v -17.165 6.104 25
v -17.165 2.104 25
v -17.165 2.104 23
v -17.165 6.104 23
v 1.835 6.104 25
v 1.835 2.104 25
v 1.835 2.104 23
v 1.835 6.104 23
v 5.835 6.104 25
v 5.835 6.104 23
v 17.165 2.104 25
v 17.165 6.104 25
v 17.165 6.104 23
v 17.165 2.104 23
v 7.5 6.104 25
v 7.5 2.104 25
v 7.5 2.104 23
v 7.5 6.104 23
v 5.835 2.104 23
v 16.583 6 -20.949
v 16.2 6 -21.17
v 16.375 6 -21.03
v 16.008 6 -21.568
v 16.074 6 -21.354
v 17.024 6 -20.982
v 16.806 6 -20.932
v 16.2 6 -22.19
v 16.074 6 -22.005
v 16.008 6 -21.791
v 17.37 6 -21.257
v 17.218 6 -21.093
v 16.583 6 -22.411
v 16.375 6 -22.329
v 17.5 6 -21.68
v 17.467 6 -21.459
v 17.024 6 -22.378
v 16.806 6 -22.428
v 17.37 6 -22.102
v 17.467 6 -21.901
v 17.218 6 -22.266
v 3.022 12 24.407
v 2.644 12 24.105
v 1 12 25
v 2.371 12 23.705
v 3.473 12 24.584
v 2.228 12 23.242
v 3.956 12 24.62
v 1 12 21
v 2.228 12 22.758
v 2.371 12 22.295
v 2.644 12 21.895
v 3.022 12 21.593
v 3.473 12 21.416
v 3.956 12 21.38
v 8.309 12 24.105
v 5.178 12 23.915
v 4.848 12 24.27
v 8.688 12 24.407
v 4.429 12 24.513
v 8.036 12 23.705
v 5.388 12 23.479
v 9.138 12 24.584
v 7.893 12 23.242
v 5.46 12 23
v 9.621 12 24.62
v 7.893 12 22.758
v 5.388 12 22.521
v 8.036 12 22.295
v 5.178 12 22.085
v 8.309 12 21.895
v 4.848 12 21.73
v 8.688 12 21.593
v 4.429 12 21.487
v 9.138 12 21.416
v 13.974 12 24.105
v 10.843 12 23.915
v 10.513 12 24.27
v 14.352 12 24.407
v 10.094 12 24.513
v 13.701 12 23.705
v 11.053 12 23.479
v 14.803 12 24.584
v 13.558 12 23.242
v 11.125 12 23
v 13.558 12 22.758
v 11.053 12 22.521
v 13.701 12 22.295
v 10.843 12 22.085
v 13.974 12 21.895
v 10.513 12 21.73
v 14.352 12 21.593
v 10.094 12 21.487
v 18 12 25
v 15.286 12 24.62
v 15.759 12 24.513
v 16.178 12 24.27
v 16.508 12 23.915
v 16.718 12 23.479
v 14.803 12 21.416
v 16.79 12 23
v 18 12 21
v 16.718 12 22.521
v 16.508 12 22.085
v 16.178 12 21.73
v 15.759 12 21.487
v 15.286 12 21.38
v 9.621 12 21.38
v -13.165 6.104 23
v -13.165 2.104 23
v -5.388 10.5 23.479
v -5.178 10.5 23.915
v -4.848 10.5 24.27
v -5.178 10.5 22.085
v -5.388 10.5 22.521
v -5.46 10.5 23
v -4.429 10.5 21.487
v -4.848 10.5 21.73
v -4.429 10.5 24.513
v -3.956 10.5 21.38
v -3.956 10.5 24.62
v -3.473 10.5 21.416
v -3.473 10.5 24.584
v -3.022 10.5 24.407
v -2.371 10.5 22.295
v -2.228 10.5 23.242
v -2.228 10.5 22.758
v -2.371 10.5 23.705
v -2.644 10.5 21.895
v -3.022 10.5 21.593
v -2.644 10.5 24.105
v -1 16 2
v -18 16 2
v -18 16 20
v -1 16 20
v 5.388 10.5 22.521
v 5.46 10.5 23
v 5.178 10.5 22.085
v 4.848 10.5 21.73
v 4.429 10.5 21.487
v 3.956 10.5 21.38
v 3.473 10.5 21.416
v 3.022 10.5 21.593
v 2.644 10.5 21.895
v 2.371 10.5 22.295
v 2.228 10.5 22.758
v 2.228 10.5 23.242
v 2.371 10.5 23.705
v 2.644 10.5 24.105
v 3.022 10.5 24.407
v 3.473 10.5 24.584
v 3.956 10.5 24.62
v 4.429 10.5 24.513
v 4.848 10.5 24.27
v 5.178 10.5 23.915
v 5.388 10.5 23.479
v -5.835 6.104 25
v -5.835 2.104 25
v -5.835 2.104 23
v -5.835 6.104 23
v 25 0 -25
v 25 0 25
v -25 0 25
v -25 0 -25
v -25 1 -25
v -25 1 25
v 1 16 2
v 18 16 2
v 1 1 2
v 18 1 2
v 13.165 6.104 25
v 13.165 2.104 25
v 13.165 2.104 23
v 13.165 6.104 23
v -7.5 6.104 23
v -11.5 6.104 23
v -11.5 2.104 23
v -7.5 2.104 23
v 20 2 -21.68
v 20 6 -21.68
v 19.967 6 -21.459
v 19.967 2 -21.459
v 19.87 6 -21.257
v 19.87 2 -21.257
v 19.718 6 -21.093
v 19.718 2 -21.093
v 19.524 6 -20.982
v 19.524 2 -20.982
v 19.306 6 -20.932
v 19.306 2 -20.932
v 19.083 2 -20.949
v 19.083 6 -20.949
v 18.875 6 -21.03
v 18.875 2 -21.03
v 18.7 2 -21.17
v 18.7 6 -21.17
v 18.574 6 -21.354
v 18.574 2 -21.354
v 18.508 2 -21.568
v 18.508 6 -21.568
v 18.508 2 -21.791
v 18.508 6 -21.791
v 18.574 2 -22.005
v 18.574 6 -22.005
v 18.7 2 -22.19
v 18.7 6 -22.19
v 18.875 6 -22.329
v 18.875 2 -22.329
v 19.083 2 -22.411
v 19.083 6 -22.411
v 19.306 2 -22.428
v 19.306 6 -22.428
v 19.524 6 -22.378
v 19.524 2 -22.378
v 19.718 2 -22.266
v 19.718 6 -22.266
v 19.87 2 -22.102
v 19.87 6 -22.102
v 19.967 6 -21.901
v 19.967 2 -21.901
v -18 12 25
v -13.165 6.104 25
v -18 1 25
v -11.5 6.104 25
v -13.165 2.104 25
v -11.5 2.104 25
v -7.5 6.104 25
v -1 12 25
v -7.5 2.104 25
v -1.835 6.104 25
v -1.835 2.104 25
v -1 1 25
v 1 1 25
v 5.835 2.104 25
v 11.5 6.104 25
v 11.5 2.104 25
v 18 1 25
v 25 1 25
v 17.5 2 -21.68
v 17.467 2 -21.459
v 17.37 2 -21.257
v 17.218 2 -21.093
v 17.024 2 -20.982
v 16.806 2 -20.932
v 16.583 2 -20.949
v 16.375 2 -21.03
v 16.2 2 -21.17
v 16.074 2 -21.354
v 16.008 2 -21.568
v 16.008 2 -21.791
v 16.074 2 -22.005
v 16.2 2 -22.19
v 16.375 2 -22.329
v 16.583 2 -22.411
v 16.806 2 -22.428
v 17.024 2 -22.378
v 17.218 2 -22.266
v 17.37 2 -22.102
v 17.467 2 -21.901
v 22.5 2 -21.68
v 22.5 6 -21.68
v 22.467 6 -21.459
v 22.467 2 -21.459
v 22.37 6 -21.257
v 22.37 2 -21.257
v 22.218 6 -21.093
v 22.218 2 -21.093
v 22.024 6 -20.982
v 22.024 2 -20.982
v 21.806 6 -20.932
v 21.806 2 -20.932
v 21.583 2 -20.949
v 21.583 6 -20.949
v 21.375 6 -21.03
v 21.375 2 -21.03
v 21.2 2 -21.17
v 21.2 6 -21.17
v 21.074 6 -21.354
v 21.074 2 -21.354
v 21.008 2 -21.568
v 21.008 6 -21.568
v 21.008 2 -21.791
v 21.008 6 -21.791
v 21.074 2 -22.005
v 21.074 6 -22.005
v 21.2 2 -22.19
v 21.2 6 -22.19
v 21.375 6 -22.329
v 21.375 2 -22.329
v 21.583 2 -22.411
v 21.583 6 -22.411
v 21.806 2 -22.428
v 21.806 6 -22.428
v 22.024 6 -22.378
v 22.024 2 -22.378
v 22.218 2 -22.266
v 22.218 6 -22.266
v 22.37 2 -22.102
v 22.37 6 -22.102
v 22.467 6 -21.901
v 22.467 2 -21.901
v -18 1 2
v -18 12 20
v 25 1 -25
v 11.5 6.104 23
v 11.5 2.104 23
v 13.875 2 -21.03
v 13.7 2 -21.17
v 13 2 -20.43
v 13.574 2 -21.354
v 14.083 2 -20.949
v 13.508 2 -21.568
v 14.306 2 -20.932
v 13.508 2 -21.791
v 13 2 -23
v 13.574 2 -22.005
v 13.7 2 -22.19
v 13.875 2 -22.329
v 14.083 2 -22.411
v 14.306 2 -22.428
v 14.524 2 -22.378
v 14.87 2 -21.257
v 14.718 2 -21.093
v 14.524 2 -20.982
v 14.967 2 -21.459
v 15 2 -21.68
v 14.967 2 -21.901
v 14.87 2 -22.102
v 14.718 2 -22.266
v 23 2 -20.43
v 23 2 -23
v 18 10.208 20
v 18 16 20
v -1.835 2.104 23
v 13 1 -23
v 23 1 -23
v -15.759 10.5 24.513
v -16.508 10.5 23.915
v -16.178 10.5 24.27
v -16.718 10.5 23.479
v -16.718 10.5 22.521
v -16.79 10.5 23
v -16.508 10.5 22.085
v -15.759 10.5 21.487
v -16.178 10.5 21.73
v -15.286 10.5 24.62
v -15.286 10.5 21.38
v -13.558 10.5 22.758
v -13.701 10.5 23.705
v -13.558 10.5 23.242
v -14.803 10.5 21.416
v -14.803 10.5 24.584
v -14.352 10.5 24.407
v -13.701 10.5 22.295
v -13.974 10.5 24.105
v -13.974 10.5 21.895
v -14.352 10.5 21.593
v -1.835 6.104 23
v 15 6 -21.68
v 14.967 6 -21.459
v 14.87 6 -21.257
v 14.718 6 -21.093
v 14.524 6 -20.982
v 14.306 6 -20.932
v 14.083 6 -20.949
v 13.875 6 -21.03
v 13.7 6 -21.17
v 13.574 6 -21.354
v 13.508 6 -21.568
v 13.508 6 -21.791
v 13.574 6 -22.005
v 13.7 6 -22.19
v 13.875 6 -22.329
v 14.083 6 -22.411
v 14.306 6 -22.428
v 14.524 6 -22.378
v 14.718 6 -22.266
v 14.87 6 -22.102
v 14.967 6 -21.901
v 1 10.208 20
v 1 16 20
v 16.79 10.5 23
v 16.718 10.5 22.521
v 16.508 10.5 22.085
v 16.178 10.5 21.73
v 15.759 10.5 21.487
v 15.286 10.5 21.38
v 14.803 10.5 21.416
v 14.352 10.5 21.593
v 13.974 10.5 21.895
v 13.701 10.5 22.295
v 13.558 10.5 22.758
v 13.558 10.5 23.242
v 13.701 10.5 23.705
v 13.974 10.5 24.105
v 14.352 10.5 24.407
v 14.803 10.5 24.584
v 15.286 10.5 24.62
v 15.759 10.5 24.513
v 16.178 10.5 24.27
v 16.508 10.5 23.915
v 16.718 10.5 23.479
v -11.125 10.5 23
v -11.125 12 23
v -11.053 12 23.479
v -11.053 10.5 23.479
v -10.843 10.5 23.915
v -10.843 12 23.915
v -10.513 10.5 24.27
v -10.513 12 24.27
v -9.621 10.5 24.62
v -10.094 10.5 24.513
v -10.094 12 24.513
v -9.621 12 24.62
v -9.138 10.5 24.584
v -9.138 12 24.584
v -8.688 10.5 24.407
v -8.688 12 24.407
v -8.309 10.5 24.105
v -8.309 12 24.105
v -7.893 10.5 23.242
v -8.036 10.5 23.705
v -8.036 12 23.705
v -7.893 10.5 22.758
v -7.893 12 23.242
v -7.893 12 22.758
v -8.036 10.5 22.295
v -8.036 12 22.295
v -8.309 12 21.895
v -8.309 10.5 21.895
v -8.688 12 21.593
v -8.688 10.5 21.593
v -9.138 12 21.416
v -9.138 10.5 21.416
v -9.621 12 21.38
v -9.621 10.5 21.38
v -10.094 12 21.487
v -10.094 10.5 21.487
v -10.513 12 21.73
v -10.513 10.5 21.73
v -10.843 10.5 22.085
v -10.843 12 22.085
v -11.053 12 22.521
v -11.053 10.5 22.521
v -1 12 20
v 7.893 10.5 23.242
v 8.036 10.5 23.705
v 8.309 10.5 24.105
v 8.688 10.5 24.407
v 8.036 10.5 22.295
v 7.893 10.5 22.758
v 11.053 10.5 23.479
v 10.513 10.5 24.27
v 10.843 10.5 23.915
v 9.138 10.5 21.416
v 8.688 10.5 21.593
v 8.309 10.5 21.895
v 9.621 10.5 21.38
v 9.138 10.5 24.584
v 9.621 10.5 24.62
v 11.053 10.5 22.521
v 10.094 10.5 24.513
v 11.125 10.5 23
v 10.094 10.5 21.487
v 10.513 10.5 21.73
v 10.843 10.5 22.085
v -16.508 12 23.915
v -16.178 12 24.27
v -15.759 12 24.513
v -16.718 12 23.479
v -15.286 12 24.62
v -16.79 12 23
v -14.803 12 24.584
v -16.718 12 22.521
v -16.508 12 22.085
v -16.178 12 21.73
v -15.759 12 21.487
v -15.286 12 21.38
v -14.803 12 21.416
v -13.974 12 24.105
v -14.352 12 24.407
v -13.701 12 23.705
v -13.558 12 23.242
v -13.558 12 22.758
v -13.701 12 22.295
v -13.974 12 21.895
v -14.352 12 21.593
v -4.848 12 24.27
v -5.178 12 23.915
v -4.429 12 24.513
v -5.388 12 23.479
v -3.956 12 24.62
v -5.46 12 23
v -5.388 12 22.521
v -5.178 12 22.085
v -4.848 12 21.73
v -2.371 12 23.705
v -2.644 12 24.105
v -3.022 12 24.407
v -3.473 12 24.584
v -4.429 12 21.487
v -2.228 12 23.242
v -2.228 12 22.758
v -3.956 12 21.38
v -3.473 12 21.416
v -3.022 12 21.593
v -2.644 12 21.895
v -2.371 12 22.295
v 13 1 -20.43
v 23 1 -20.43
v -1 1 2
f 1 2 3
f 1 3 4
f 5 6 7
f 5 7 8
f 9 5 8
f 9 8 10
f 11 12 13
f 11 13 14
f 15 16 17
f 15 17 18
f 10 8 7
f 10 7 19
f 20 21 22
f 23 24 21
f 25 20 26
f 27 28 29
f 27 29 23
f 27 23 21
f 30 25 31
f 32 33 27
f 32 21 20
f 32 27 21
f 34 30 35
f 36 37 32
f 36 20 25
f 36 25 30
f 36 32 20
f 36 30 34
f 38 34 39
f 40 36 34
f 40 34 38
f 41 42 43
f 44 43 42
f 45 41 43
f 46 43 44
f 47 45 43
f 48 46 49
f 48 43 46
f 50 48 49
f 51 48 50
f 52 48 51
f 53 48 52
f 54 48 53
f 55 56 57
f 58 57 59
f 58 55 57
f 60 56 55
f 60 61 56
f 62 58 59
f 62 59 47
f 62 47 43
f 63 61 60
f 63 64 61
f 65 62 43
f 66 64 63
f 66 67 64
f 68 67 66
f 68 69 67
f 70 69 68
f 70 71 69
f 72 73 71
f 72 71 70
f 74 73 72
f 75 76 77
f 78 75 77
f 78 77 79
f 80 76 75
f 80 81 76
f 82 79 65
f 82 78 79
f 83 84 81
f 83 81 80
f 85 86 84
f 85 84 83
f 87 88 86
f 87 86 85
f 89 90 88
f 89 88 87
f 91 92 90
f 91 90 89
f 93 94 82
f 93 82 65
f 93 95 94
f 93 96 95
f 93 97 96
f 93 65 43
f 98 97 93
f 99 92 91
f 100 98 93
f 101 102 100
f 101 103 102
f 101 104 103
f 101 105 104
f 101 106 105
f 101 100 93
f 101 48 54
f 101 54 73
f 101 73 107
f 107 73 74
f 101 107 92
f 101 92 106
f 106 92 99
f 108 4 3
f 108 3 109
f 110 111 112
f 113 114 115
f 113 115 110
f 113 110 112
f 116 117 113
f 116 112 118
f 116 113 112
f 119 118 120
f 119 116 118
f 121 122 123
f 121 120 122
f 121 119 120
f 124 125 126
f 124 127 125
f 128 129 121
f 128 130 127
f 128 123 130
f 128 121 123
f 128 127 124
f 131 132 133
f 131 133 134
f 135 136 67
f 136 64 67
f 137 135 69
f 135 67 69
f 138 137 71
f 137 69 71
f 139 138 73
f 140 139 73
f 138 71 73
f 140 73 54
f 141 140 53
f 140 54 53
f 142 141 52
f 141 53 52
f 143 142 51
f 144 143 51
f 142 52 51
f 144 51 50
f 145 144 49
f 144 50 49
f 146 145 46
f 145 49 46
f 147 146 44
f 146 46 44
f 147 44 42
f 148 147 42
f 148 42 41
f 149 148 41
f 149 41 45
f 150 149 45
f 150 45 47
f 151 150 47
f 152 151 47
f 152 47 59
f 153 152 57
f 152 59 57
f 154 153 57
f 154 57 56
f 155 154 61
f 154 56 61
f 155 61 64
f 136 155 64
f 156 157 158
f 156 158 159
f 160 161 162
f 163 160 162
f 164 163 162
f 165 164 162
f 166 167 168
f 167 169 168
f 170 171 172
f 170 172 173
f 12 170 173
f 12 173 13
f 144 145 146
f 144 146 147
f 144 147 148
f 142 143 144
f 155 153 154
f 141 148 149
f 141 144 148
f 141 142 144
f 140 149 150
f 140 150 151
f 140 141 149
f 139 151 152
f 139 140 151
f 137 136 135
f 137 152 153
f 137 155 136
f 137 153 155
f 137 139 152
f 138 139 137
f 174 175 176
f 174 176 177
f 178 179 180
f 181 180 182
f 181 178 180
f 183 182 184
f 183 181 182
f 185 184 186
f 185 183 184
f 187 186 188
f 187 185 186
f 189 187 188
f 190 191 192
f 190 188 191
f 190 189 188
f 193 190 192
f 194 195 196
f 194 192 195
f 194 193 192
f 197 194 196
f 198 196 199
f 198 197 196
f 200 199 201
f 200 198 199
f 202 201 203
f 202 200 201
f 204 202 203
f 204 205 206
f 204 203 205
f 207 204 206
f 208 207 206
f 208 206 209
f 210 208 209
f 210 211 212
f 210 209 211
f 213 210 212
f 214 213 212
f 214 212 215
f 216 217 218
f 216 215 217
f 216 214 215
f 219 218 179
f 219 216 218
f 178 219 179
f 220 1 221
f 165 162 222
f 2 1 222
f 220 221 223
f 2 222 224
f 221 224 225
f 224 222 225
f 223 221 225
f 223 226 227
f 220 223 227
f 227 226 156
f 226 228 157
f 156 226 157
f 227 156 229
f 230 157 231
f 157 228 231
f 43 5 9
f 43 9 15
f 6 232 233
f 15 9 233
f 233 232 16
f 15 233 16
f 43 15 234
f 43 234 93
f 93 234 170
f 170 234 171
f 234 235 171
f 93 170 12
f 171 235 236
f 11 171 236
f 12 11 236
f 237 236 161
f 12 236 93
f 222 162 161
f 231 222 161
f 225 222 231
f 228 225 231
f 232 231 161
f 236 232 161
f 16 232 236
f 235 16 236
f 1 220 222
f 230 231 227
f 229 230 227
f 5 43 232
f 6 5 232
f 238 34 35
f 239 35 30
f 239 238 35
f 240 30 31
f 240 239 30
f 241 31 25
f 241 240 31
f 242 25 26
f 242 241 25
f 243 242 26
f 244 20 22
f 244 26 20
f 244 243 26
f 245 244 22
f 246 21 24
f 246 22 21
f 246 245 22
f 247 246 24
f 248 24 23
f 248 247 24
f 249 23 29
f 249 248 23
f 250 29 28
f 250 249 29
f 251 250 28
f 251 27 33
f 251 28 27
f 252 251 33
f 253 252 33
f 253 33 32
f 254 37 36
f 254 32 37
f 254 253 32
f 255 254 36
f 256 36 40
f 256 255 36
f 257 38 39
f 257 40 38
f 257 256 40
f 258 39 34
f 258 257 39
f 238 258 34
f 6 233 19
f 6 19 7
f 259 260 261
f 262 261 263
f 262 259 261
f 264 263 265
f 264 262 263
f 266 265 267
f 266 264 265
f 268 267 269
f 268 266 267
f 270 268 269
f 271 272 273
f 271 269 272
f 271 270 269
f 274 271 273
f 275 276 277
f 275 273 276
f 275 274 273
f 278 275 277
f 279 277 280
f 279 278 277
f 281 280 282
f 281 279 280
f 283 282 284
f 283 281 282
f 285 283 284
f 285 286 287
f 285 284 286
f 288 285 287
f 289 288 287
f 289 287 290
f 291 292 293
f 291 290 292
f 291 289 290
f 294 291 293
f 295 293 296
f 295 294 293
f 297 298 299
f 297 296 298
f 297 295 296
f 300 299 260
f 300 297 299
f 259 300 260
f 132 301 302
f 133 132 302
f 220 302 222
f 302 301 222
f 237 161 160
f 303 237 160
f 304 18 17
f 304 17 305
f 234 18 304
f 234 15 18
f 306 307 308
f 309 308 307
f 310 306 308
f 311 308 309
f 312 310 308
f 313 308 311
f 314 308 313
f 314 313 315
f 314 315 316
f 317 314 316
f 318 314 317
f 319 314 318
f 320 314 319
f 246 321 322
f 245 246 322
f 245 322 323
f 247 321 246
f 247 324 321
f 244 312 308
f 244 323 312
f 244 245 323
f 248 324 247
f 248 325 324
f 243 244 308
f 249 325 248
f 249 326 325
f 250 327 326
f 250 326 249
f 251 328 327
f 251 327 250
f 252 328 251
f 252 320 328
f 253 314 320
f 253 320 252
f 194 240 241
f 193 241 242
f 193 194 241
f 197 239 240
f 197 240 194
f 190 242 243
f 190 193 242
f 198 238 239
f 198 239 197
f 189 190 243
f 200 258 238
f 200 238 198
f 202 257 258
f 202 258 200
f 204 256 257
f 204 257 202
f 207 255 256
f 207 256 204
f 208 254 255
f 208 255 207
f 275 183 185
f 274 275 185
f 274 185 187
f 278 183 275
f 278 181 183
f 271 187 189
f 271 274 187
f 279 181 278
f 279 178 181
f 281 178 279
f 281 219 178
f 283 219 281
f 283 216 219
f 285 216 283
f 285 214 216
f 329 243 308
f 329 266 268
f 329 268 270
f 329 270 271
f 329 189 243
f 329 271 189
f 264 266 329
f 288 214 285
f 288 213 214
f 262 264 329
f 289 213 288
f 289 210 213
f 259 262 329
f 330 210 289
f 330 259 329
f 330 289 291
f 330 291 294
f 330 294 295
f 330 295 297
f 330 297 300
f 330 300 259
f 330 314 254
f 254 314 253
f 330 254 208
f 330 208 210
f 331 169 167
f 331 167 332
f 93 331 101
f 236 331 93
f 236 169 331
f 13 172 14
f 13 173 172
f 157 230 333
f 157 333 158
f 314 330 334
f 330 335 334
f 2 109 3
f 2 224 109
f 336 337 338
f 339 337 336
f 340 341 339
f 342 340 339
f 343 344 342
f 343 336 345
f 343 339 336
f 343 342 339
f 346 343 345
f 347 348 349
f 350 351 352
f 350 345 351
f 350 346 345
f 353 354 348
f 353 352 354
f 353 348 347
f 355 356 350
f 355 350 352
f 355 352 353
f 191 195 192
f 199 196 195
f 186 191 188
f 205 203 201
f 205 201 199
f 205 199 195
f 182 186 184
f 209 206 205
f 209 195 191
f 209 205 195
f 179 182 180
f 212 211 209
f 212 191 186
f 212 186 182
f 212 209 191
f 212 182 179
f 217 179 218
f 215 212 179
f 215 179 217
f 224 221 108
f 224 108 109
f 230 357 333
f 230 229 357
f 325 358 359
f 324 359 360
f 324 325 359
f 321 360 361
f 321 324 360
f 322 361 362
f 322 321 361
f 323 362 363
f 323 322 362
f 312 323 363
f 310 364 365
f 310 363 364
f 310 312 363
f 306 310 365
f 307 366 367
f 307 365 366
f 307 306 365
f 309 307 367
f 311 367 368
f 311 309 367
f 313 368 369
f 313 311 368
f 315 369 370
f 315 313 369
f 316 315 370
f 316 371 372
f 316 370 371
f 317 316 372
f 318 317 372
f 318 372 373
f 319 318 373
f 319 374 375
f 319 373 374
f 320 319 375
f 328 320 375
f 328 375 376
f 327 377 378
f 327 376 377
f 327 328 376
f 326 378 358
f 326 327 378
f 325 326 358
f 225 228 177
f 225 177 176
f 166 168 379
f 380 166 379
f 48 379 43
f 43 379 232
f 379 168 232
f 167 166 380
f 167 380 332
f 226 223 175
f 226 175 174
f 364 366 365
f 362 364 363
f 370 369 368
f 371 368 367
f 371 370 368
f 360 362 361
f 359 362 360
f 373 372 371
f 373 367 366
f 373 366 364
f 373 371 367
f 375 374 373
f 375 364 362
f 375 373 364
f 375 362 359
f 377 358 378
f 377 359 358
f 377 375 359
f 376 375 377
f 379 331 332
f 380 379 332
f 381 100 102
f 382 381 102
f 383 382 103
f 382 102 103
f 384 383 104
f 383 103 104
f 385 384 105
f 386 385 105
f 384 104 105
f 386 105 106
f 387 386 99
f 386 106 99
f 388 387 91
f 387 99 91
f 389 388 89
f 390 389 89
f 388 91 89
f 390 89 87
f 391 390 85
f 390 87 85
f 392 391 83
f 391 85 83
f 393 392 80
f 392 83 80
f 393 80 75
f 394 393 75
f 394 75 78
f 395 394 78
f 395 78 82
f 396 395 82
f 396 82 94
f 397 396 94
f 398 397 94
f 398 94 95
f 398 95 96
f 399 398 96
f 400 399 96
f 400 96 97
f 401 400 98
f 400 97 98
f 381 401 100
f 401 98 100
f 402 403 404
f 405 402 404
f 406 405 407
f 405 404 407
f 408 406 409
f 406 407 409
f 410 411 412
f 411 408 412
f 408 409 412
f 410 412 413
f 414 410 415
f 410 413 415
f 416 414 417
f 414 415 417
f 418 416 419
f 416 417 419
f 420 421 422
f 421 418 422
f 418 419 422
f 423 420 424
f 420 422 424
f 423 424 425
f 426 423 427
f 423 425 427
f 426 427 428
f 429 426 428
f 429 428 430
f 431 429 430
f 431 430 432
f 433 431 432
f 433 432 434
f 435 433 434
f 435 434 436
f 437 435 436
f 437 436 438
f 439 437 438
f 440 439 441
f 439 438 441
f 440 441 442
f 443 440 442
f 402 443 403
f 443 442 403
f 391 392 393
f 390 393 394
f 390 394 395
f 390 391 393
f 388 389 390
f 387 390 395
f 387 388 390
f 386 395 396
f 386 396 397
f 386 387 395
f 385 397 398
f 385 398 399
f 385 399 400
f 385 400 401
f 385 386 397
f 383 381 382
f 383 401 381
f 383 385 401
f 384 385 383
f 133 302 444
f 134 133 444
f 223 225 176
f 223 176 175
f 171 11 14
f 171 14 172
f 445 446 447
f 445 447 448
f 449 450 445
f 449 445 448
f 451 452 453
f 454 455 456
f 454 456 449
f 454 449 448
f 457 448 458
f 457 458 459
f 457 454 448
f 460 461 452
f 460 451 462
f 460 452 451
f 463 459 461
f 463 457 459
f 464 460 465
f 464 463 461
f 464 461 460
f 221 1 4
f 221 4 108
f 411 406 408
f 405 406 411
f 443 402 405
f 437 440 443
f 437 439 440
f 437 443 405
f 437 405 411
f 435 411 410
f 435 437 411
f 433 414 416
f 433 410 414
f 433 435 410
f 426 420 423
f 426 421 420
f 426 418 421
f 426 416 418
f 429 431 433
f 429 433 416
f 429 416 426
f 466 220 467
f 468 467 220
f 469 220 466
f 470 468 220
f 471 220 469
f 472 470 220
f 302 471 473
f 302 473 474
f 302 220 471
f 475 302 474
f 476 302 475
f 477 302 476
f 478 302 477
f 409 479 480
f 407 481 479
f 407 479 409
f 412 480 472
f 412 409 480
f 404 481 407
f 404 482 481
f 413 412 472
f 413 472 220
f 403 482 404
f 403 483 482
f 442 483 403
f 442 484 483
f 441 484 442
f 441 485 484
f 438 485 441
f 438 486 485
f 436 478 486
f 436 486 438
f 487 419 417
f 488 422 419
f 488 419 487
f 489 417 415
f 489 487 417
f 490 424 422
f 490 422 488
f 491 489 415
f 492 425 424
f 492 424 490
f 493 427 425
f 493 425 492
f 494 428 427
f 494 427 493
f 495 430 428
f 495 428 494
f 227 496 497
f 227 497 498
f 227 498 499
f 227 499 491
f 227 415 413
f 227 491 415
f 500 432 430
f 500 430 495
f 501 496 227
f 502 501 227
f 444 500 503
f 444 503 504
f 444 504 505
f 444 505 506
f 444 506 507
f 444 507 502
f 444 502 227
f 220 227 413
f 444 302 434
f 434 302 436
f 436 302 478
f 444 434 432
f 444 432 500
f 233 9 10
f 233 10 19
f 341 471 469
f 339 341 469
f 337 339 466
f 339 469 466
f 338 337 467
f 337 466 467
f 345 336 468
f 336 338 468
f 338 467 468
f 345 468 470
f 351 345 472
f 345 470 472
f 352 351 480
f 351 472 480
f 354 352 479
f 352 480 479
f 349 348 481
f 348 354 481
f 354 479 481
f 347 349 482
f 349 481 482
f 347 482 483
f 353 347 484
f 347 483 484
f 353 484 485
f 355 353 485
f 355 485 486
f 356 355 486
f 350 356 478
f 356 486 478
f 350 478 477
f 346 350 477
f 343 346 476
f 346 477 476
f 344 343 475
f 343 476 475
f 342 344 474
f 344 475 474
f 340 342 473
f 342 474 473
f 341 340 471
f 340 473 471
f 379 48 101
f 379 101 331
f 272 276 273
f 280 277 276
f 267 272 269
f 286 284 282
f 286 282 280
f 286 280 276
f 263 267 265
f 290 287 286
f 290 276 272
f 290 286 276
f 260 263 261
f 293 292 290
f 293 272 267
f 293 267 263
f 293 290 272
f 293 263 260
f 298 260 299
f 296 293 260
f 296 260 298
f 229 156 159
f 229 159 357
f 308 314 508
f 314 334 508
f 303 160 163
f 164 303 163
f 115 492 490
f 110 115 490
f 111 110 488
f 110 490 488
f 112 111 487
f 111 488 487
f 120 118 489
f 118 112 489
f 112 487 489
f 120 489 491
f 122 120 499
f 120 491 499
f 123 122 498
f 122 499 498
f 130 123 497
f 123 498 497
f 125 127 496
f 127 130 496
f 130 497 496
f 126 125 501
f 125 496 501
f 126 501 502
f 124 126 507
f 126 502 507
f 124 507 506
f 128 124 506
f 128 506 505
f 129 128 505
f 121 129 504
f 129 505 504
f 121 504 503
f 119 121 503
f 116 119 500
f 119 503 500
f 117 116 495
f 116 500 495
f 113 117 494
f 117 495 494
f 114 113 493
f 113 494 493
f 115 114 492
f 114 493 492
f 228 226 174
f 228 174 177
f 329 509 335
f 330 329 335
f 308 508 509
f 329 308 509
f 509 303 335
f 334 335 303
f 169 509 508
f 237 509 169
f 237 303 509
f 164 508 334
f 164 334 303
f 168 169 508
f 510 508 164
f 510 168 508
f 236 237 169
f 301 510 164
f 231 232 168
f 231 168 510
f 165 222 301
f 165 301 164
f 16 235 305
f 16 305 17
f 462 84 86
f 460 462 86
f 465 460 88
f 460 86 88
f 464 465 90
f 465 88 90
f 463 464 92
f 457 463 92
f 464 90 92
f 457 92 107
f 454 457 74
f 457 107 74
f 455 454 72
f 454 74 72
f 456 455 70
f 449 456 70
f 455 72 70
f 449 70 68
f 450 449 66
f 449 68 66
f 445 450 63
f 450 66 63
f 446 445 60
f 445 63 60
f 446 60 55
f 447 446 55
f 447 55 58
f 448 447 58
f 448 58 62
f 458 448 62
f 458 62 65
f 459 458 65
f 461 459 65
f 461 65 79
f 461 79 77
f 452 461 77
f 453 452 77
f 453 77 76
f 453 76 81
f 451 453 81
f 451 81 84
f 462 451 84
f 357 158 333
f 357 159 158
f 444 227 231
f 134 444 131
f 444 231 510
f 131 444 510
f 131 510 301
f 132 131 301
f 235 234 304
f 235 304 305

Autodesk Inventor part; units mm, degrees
ref_plane "YZ Plane" through (0, 0, 0) normal (1, 0, 0) x (0, 1, 0)
ref_plane "XZ Plane" through (0, 0, 0) normal (0, 1, 0) x (-1, 0, 0)
ref_plane "XY Plane" through (0, 0, 0) normal (0, 0, 1) x (1, 0, 0)
sketch "Sketch1" plane through (0, 0, 0) normal (0, 1, 0) x (-1, 0, 0)
  line L0 (-25, 25) -> (-25, -25)
  line L1 (-25, -25) -> (25, -25)
  line L2 (25, -25) -> (25, 25)
  line L3 (25, 25) -> (-25, 25)
  line L4 (-25, 25) -> (25, -25) construction
  line L5 (-25, -25) -> (25, 25) construction
  point P0 (0, 0)
  dimension "d0" = 50
  dimension "d1" = 50
extrude "Extrusion1" add sketch "Sketch1" along normal blind 1
sketch "Sketch2" plane through (0, 1, 0) normal (0, 1, 0) x (1, 0, 0)
  line L0 (25, -25) -> (25, 25) construction
  line L1 (25, -25) -> (25, -20) construction
  line L2 (25, -20) -> (-25, -20) construction
  line L3 (-25, 25) -> (-25, -25) construction
  line L4 (25, -20) -> (25, -2) construction
  line L5 (25, -2) -> (-25, -2) construction
  line L6 (25, -20) -> (18, -20) construction
  line L7 (18, -20) -> (18, -2) construction
  line L8 (-25, -20) -> (-18, -20) construction
  line L9 (-18, -20) -> (-18, -2) construction
  line L10 (1, -2) -> (-1, -2) construction
  line L11 (-1, -2) -> (-1, -20) construction
  line L12 (-1, -20) -> (1, -20) construction
  line L13 (1, -20) -> (1, -2) construction
  line L14 (1, -2) -> (-1, -20) construction
  line L15 (-1, -2) -> (1, -20) construction
  line L16 (18, -2) -> (1, -2)
  line L17 (1, -2) -> (1, -20)
  line L18 (1, -20) -> (18, -20)
  line L19 (18, -20) -> (18, -2)
  line L20 (-1, -2) -> (-18, -2)
  line L21 (-18, -2) -> (-18, -20)
  line L22 (-18, -20) -> (-1, -20)
  line L23 (-1, -20) -> (-1, -2)
  point P0 (0, 0)
  point P1 (0, -11)
  dimension "d4" = 5
  dimension "d5" = 18
  dimension "d6" = 7
  dimension "d7" = 7
  dimension "d8" = 2
extrude "Extrusion2" add sketch "Sketch2" along normal blind 15
sketch "Sketch3" plane through (0, 1, 0) normal (0, 1, 0) x (1, 0, 0)
  line L0 (18, -20) -> (1, -20) projected
  line L1 (18, -20) -> (18, -25)
  line L2 (-25, -25) -> (25, -25) projected
  line L3 (1, -20) -> (1, -25)
  line L4 (1, -25) -> (18, -25)
  line L5 (18, -20) -> (1, -20)
  line L6 (18, -25) -> (12.33, -25)
  line L7 (12.33, -25) -> (12.33, -20)
  line L8 (18, -20) -> (12.33, -20)
  line L9 (12.33, -20) -> (6.66, -20)
  line L10 (6.66, -20) -> (6.66, -25)
  line L11 (6.66, -20) -> (1, -20)
  point P0 (0, 0)
  dimension "d11" = 5.67
  dimension "d12" = 5.67
extrude "Extrusion3" add sketch "Sketch3" along normal blind 11
sketch "Sketch4" plane through (18, 1, 25) normal (1, 0, 0) x (0, 0, -1)
  line L0 (5, 11) -> (5, 15) projected
  line L1 (5, 11) -> (4, 11)
  line L2 (0, 11) -> (5, 11) projected
  line L3 (4, 11) -> (5, 9.2085)
  line L4 (5, 0) -> (5, 15) projected
  point P0 (25, -1)
  dimension "d9" = 15
  dimension "d15" = 1
extrude "Extrusion4" cut sketch "Sketch4" against normal through all
sketch "Sketch5" plane through (0, 12, 0) normal (0, 1, 0) x (1, 0, 0)
  line L0 (18, -25) -> (18, -21) construction
  line L1 (18, -21) -> (12.33, -21) construction
  line L2 (18, -21) -> (1, -21) construction
  line L3 (12.33, -21) -> (12.33, -25.0141) construction
  line L4 (12.33, -25.0141) -> (6.66, -25) construction
  line L5 (1, -25) -> (18, -25) construction
  line L6 (6.66, -25) -> (6.67, -21) construction
  line L7 (6.67, -21) -> (1, -21) construction
  line L8 (-25, -25) -> (1, -25) construction
  line L9 (1, -21) -> (1, -25) construction
  circle A0 centre (3.835, -23) radius 1.625
  circle A1 centre (9.5, -23) radius 1.625
  circle A2 centre (15.165, -23) radius 1.625
  point P0 (0, 0)
  dimension "d18" = 5.67
  dimension "d19" = 5.67
  dimension "d20" = 5.67
  dimension "d21" = 3.25
  dimension "d22" = 3.25
  dimension "d23" = 3.25
extrude "Extrusion5" cut sketch "Sketch5" against normal blind 1.5
sketch "Sketch6" plane through (-25, 0, 25) normal (0, 0, 1) x (1, 0, 0)
  line L0 (0, 1) -> (26, 1) projected
  line L1 (26, 1) -> (43.0101, 1)
  line L2 (26, 12) -> (43, 12) construction
  line L3 (26, 12) -> (31.67, 12) construction
  line L4 (31.67, 12) -> (31.67, 1) construction
  line L5 (31.67, 1) -> (37.34, 1) construction
  line L6 (50, 1) -> (0, 1) construction
  line L7 (37.34, 1) -> (37.34, 12) construction
  line L8 (26.835, 6.1045) -> (30.835, 6.1045)
  line L9 (30.835, 6.1045) -> (30.835, 2.1045)
  line L10 (30.835, 2.1045) -> (26.835, 2.1045)
  line L11 (26.835, 2.1045) -> (26.835, 6.1045)
  line L12 (26.835, 6.1045) -> (30.835, 2.1045) construction
  line L13 (30.835, 6.1045) -> (26.835, 2.1045) construction
  point P0 (25, 0)
  point P1 (28.835, 4.1045)
  dimension "d26" = 5.67
  dimension "d27" = 5.67
  dimension "d28" = 4
  dimension "d29" = 4
extrude "Extrusion6" cut sketch "Sketch6" against normal blind 2
ref_plane "Work Plane1" through (9.5, 1, 2) normal (-1, 0, 0) x (0, 0, 1)
mirror "Mirror1" about plane through (9.5, 1, 2) normal (-1, 0, 0) of "Extrusion6"
ref_plane "Work Plane2" through (6.6675, 1, 2) normal (-1, 0, 0) x (0, 0, 1)
mirror "Mirror2" about plane through (6.6675, 1, 2) normal (-1, 0, 0) of "Extrusion6"
ref_plane "Work Plane3" through (0, 0, -25) normal (-1, 0, 0) x (0, 0, 1)
mirror "Mirror3" about plane through (0, 0, -25) normal (-1, 0, 0) of "Extrusion3", "Extrusion5", "Extrusion6", "Mirror1", "Mirror2", "Extrusion2"
sketch "Sketch7" plane through (0, 1, 0) normal (0, 1, 0) x (1, 0, 0)
  line L0 (25, 25) -> (25, 23) construction
  line L1 (25, -25) -> (25, 25) construction
  line L2 (25, 23) -> (23, 23) construction
  line L3 (23, 23) -> (13, 23)
  line L4 (13, 23) -> (13, 20.4297)
  line L5 (13, 20.4297) -> (23, 20.4297)
  line L6 (23, 20.4297) -> (23, 23)
  line L7 (18, 20.4297) -> (18, 23)
  line L8 (18, 20.4297) -> (23, 20.4297)
  line L9 (20.5, 20.4297) -> (20.5, 23)
  line L10 (18, 20.4297) -> (13, 20.4297)
  line L11 (15.5, 20.4297) -> (15.5, 23)
  circle A0 centre (21.75, 21.6797) radius 1.25
  circle A1 centre (19.25, 21.6797) radius 1.25
  circle A2 centre (16.75, 21.6797) radius 1.25
  circle A3 centre (14.25, 21.6797) radius 1.25
  circle A4 centre (21.75, 21.6797) radius 0.75
  circle A5 centre (19.25, 21.6797) radius 0.75
  circle A6 centre (16.75, 21.6797) radius 0.75
  circle A7 centre (14.25, 21.6797) radius 0.75
  point P0 (0, 0)
  dimension "d33" = 2
  dimension "d34" = 2
  dimension "d35" = 10
  dimension "d36" = 0.5
  dimension "d37" = 0.5
  dimension "d38" = 0.5
  dimension "d39" = 0.5
extrude "Extrusion7" add sketch "Sketch7" along normal blind 5 contours A4 | A5 | A6 | A7
extrude "Extrusion8" add sketch "Sketch7" along normal blind 1 contours L6 A0 L9 L3 | L9 A1 L7 L3 | A0 | L6 L5 A0 | L7 A2 L11 L3 | A0 L5 L9 | A1 | L9 L5 A1 | L11 A3 L4 L3 | A1 L5 L7 | A2 | L7 L5 A2 | A2 L5 L11 | A3 | L11 L5 A3 | A3 L5 L4 | A4 | A5 | A6 | A7
properties part number "H Bridge #2"
